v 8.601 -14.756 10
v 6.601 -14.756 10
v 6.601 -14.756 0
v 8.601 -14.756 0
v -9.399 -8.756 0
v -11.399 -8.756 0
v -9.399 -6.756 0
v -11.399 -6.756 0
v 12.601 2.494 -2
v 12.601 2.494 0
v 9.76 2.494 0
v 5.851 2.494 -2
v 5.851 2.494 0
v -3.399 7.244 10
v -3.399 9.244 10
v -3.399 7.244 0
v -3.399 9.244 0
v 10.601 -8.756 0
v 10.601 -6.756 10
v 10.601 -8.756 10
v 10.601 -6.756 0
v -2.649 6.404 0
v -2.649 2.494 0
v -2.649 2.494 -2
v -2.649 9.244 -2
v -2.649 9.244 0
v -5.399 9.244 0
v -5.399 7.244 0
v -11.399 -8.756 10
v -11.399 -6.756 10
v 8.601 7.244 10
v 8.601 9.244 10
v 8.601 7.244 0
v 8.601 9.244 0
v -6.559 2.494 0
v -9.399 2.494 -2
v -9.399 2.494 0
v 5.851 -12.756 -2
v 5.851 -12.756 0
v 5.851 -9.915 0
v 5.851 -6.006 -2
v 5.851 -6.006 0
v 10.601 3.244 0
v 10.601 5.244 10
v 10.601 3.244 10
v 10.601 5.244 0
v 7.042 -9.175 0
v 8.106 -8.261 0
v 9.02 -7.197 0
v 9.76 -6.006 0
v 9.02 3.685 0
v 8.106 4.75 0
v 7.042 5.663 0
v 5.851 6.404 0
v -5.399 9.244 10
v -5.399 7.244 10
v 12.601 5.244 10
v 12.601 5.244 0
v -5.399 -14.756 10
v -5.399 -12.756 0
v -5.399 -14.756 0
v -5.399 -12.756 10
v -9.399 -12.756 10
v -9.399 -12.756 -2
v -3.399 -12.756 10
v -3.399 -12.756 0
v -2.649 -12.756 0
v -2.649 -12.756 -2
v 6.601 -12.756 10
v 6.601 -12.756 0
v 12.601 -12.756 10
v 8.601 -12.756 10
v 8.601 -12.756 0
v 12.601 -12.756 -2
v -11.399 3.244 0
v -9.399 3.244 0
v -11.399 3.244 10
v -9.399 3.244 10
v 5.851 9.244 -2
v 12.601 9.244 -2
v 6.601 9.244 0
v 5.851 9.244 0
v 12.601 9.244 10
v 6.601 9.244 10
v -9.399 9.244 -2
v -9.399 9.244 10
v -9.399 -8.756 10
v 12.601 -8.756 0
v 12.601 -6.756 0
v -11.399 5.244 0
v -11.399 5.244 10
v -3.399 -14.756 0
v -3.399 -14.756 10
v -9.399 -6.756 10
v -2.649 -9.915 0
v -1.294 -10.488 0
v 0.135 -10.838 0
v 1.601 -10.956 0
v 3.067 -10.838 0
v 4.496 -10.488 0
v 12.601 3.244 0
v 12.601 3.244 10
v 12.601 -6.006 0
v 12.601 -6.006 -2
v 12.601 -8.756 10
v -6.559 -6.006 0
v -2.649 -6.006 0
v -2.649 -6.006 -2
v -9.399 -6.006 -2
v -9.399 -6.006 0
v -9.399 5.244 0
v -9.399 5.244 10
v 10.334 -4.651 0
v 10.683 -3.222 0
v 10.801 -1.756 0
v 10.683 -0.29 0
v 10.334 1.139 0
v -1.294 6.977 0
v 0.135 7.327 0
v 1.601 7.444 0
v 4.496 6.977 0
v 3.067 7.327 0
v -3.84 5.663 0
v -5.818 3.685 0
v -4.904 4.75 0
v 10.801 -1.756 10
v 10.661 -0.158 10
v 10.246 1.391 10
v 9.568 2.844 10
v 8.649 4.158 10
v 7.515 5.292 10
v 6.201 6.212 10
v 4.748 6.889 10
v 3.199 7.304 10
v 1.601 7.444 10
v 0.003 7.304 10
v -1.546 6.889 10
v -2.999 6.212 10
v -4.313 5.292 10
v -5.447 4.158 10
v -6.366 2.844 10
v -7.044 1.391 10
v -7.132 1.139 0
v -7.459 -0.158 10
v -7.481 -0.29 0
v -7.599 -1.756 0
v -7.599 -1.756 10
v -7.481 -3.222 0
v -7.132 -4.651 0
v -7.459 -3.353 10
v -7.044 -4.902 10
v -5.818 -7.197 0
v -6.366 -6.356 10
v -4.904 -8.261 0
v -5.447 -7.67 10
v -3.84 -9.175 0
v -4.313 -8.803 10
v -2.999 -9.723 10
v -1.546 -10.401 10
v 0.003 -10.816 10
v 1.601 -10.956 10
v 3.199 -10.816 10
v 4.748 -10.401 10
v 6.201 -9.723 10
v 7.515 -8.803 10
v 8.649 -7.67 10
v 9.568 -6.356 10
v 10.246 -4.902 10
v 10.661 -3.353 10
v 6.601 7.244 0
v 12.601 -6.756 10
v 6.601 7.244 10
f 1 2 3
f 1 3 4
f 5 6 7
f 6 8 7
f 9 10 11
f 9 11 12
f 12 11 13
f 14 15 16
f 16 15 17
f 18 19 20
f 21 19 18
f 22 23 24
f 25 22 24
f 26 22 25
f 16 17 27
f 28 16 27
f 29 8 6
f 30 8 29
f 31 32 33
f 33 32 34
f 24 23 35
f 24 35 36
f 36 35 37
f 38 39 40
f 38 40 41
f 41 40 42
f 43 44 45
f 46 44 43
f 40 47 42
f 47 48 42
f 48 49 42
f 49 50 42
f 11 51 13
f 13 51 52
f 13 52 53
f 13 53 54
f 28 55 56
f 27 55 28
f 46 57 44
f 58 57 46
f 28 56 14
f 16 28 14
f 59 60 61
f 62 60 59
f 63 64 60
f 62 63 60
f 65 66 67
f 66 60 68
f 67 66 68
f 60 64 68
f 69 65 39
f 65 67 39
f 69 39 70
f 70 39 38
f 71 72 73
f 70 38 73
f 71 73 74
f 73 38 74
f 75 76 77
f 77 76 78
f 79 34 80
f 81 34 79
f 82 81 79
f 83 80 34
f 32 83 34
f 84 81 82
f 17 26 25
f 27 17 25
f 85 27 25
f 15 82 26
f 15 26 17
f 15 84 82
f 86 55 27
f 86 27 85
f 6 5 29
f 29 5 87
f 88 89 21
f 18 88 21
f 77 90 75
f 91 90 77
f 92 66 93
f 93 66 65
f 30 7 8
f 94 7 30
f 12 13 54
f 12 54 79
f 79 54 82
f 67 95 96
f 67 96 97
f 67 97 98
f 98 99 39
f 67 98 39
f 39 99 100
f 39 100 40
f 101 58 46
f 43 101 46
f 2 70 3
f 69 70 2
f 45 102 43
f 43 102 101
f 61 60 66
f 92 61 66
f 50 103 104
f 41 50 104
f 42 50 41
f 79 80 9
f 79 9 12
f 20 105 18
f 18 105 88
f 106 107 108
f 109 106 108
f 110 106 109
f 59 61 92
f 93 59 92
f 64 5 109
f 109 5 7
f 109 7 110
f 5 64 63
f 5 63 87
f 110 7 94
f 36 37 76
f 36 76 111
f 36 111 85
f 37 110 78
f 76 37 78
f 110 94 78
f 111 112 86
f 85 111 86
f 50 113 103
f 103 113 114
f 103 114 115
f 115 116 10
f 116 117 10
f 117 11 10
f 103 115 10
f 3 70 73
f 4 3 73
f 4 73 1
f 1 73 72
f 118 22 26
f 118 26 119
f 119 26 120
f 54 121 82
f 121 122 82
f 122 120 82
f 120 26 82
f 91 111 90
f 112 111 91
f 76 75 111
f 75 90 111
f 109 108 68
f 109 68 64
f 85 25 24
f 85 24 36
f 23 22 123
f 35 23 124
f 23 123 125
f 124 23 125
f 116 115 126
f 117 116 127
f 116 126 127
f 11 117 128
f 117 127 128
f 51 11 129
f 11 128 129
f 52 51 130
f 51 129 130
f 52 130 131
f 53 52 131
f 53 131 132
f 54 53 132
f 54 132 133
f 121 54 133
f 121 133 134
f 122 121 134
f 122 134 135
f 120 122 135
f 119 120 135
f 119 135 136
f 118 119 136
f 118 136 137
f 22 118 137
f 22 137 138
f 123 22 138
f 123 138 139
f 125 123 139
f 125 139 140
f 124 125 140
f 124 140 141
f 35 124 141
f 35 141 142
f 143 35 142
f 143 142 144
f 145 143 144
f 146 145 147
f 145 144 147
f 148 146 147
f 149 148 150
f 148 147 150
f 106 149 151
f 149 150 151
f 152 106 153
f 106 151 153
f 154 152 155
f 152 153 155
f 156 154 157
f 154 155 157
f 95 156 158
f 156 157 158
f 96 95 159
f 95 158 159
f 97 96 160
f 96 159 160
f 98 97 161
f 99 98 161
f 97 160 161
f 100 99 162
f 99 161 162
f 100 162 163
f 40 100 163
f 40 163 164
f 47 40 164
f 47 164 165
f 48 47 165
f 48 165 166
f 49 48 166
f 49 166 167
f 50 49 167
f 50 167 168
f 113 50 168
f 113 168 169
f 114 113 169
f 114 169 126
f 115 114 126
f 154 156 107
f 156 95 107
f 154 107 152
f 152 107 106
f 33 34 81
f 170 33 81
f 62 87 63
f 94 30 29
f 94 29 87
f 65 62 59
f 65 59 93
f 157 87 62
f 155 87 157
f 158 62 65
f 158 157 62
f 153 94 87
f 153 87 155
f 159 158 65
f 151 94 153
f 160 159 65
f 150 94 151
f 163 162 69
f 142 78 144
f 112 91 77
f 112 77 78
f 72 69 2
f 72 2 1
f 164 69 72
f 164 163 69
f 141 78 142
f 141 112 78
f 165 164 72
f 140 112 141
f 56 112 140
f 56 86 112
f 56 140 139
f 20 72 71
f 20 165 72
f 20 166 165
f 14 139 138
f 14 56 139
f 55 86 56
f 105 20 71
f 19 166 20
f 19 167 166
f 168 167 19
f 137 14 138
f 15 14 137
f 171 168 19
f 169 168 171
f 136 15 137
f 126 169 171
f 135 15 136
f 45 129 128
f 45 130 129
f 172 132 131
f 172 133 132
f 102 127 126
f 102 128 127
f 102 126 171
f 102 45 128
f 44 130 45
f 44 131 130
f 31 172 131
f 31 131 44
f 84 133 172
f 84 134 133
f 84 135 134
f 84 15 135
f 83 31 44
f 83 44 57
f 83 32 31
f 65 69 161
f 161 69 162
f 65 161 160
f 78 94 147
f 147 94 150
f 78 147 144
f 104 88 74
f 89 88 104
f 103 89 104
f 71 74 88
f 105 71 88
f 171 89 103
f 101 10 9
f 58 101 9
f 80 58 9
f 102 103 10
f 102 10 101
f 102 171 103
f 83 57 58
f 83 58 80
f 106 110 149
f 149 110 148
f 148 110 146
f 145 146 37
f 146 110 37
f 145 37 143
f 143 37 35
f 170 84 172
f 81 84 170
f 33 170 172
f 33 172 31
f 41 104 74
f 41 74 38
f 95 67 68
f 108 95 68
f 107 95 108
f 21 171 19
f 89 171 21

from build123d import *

# Parameters (mm, degrees)
SKETCH1_W           = 22
SKETCH1_H           = 22
BOSS_EXTRUDE1_DEPTH = 10
SKETCH3_W           = 2
SKETCH3_H           = 10
BOSS_EXTRUDE2_DEPTH = 2
SKETCH4_W           = 10
SKETCH4_H           = 2
BOSS_EXTRUDE3_DEPTH = 2
SKETCH5_W           = 10
SKETCH5_H           = 2
CUT_EXTRUDE1_DEPTH  = 2
SKETCH6_W           = 2
SKETCH6_H           = 10
CUT_EXTRUDE2_DEPTH  = 2
SKETCH7_R           = 9.2
CUT_EXTRUDE3_DEPTH  = 11
SKETCH8_W           = 6.75
SKETCH8_H           = 6.75
BOSS_EXTRUDE4_DEPTH = 2


with BuildPart() as part:
    # Sketch1 → Boss-Extrude1 (new body)
    with BuildSketch(Plane.XY):
        with Locations((1.600938967, -1.755868545)):
            Rectangle(SKETCH1_W, SKETCH1_H)
    extrude(amount=BOSS_EXTRUDE1_DEPTH)

    # Sketch3 → Boss-Extrude2 (add)
    with BuildSketch(Plane.XZ.offset(12.755868545)):
        with Locations((7.600938967, 5)):
            Rectangle(SKETCH3_W, SKETCH3_H)
        with Locations((-4.399061033, 5)):
            Rectangle(SKETCH3_W, SKETCH3_H)
    extrude(amount=BOSS_EXTRUDE2_DEPTH)

    # Sketch4 → Boss-Extrude3 (add)
    with BuildSketch(Plane.ZY.offset(9.399061033)):
        with Locations((5, 4.244131455)):
            Rectangle(SKETCH4_W, SKETCH4_H)
        with Locations((5, -7.755868545)):
            Rectangle(SKETCH4_W, SKETCH4_H)
    extrude(amount=BOSS_EXTRUDE3_DEPTH)

    # Sketch5 → Cut-Extrude1 (cut)
    with BuildSketch(Plane(origin=(12.600938967, 0, 0), x_dir=(0, 0, -1), z_dir=(1, 0, 0))):
        with Locations((-5, 4.244131455)):
            Rectangle(SKETCH5_W, SKETCH5_H)
        with Locations((-5, -7.755868545)):
            Rectangle(SKETCH5_W, SKETCH5_H)
    extrude(amount=-CUT_EXTRUDE1_DEPTH, mode=Mode.SUBTRACT)

    # Sketch6 → Cut-Extrude2 (cut)
    with BuildSketch(Plane(origin=(0, 9.244131455, 0), x_dir=(1, 0, 0), z_dir=(0, 1, 0))):
        with Locations((-4.399061033, -5)):
            Rectangle(SKETCH6_W, SKETCH6_H)
        with Locations((7.600938967, -5)):
            Rectangle(SKETCH6_W, SKETCH6_H)
    extrude(amount=-CUT_EXTRUDE2_DEPTH, mode=Mode.SUBTRACT)

    # Sketch7 → Cut-Extrude3 (cut, through all)
    with BuildSketch(Plane.XY.offset(10)):
        with Locations((1.600938967, -1.755868545)):
            Circle(SKETCH7_R)
    extrude(amount=-CUT_EXTRUDE3_DEPTH, mode=Mode.SUBTRACT)

    # Sketch8 → Boss-Extrude4 (add)
    with BuildSketch(Plane(origin=(0, 0, 0), x_dir=(-1, 0, 0), z_dir=(0, 0, -1))):
        with Locations((6.024061033, 5.869131455)):
            Rectangle(SKETCH8_W, SKETCH8_H)
        with Locations((-9.225938967, 5.869131455)):
            Rectangle(SKETCH8_W, SKETCH8_H)
        with Locations((-9.225938967, -9.380868545)):
            Rectangle(SKETCH8_W, SKETCH8_H)
        with Locations((6.024061033, -9.380868545)):
            Rectangle(SKETCH8_W, SKETCH8_H)
    extrude(amount=BOSS_EXTRUDE4_DEPTH)


solid = part.part
